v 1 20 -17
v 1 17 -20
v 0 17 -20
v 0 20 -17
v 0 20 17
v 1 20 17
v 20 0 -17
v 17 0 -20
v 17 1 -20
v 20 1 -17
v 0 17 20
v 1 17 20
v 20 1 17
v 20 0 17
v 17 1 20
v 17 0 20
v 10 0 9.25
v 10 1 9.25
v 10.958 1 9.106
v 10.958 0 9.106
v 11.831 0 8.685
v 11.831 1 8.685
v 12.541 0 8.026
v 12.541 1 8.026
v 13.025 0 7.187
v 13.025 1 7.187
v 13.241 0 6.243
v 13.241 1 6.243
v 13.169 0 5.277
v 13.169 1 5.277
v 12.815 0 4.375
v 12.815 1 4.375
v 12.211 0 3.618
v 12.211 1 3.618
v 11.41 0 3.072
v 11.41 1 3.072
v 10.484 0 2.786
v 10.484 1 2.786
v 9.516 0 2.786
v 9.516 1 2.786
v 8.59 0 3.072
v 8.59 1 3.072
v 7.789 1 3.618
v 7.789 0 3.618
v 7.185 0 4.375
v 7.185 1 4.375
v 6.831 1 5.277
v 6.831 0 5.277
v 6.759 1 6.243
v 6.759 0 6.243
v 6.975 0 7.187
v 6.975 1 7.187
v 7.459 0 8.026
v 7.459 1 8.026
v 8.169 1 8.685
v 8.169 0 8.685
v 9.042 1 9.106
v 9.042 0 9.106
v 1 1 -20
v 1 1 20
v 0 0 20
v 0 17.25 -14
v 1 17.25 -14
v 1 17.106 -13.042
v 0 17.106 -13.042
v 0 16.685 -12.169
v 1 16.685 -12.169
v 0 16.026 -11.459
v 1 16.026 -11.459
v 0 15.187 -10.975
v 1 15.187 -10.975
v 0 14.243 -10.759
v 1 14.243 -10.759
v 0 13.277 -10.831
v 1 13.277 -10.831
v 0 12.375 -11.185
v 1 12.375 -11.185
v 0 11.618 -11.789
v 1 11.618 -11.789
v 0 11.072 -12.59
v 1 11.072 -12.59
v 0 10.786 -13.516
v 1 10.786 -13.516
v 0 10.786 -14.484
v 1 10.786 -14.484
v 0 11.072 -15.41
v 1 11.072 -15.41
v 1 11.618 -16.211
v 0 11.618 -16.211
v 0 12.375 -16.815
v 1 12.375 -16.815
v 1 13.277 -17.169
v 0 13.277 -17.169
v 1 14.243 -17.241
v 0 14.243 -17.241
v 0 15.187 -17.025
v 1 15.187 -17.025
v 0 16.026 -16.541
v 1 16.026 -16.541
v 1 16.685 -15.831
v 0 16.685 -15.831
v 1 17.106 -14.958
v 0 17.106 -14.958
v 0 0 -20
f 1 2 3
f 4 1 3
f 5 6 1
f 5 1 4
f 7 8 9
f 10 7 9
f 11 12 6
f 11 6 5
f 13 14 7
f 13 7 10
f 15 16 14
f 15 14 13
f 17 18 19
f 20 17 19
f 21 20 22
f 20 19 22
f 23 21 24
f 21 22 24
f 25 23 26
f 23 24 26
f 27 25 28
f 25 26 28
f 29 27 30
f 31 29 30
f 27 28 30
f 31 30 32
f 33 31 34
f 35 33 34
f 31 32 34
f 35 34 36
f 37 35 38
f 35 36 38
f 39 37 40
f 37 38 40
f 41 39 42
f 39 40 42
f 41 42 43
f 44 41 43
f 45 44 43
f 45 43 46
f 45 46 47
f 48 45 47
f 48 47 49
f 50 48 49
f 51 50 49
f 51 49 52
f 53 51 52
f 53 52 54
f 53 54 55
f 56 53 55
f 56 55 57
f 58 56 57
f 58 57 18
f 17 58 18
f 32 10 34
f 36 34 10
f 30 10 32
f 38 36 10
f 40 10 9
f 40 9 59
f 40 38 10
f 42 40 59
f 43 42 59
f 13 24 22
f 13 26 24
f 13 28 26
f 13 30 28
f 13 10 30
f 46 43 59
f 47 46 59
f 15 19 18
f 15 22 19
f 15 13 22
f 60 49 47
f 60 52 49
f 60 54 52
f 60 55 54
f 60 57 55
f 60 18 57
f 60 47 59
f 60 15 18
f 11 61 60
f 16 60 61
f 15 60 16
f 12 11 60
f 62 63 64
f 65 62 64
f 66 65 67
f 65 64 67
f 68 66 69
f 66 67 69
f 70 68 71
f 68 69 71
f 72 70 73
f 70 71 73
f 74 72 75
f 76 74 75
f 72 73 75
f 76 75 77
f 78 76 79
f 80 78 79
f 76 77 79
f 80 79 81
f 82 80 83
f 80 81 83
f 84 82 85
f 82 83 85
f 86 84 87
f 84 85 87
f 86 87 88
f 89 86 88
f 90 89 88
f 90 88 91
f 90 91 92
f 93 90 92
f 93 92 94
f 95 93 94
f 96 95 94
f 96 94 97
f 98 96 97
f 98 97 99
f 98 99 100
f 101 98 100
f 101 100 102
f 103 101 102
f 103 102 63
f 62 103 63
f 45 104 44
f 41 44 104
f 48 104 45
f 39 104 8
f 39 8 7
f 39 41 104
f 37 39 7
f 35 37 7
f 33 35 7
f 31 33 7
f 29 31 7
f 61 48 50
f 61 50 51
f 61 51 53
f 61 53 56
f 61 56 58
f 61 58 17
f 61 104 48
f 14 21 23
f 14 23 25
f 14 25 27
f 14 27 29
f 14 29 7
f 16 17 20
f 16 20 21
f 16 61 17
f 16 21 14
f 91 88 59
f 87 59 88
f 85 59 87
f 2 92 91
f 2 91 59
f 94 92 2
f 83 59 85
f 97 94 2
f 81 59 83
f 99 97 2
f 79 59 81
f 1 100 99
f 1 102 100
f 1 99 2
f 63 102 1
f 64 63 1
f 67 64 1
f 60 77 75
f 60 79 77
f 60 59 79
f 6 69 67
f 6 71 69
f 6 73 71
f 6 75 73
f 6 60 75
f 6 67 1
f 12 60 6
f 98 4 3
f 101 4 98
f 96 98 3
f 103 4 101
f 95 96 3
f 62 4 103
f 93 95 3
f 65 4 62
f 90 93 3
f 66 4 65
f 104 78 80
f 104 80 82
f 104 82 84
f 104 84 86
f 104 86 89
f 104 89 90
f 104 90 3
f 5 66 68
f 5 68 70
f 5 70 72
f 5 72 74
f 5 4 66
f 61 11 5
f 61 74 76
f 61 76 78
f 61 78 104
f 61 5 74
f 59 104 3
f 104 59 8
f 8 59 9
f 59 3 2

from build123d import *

# Parameters (mm, degrees)
LINEAR_AUSTRAGEN_D_NN1_DEPTH    = 20
FASE1_SIZE                      = 3
SKIZZE2_R                       = 3.25
SCHNITT_LINEAR_AUSTRAGEN1_DEPTH = 10
SKIZZE3_R                       = 3.25
SCHNITT_LINEAR_AUSTRAGEN2_DEPTH = 10


with BuildPart() as part:
    # Skizze1 → Linear-Austragen-Dünn1 (new, symmetric)
    with BuildSketch(Plane.XY):
        Polygon((0, 20), (0, 0), (20, 0), (20, 1), (1, 1), (1, 20), align=None)
    extrude(amount=LINEAR_AUSTRAGEN_D_NN1_DEPTH, both=True)

    # Fase1
    fase1_edges = [part.edges().sort_by_distance(p)[0] for p in [
        (0.5, 20, 20),
        (0.5, 20, -20),
        (20, 0.5, -20),
        (20, 0.5, 20),
    ]]
    chamfer(fase1_edges, length=FASE1_SIZE)

    # Skizze2 → Schnitt-Linear austragen1 (cut)
    with BuildSketch(Plane(origin=(0, 1, 0), x_dir=(1, 0, 0), z_dir=(0, 1, 0))):
        with Locations(Location((10, -6, 0), (0, 0, 270))):
            Circle(SKIZZE2_R)
    extrude(amount=-SCHNITT_LINEAR_AUSTRAGEN1_DEPTH, mode=Mode.SUBTRACT)

    # Skizze3 → Schnitt-Linear austragen2 (cut)
    with BuildSketch(Plane(origin=(1, 0, 0), x_dir=(0, 0, -1), z_dir=(1, 0, 0))):
        with Locations(Location((14, 14, 0), (0, 0, 90))):
            Circle(SKIZZE3_R)
    extrude(amount=-SCHNITT_LINEAR_AUSTRAGEN2_DEPTH, mode=Mode.SUBTRACT)


solid = part.part
